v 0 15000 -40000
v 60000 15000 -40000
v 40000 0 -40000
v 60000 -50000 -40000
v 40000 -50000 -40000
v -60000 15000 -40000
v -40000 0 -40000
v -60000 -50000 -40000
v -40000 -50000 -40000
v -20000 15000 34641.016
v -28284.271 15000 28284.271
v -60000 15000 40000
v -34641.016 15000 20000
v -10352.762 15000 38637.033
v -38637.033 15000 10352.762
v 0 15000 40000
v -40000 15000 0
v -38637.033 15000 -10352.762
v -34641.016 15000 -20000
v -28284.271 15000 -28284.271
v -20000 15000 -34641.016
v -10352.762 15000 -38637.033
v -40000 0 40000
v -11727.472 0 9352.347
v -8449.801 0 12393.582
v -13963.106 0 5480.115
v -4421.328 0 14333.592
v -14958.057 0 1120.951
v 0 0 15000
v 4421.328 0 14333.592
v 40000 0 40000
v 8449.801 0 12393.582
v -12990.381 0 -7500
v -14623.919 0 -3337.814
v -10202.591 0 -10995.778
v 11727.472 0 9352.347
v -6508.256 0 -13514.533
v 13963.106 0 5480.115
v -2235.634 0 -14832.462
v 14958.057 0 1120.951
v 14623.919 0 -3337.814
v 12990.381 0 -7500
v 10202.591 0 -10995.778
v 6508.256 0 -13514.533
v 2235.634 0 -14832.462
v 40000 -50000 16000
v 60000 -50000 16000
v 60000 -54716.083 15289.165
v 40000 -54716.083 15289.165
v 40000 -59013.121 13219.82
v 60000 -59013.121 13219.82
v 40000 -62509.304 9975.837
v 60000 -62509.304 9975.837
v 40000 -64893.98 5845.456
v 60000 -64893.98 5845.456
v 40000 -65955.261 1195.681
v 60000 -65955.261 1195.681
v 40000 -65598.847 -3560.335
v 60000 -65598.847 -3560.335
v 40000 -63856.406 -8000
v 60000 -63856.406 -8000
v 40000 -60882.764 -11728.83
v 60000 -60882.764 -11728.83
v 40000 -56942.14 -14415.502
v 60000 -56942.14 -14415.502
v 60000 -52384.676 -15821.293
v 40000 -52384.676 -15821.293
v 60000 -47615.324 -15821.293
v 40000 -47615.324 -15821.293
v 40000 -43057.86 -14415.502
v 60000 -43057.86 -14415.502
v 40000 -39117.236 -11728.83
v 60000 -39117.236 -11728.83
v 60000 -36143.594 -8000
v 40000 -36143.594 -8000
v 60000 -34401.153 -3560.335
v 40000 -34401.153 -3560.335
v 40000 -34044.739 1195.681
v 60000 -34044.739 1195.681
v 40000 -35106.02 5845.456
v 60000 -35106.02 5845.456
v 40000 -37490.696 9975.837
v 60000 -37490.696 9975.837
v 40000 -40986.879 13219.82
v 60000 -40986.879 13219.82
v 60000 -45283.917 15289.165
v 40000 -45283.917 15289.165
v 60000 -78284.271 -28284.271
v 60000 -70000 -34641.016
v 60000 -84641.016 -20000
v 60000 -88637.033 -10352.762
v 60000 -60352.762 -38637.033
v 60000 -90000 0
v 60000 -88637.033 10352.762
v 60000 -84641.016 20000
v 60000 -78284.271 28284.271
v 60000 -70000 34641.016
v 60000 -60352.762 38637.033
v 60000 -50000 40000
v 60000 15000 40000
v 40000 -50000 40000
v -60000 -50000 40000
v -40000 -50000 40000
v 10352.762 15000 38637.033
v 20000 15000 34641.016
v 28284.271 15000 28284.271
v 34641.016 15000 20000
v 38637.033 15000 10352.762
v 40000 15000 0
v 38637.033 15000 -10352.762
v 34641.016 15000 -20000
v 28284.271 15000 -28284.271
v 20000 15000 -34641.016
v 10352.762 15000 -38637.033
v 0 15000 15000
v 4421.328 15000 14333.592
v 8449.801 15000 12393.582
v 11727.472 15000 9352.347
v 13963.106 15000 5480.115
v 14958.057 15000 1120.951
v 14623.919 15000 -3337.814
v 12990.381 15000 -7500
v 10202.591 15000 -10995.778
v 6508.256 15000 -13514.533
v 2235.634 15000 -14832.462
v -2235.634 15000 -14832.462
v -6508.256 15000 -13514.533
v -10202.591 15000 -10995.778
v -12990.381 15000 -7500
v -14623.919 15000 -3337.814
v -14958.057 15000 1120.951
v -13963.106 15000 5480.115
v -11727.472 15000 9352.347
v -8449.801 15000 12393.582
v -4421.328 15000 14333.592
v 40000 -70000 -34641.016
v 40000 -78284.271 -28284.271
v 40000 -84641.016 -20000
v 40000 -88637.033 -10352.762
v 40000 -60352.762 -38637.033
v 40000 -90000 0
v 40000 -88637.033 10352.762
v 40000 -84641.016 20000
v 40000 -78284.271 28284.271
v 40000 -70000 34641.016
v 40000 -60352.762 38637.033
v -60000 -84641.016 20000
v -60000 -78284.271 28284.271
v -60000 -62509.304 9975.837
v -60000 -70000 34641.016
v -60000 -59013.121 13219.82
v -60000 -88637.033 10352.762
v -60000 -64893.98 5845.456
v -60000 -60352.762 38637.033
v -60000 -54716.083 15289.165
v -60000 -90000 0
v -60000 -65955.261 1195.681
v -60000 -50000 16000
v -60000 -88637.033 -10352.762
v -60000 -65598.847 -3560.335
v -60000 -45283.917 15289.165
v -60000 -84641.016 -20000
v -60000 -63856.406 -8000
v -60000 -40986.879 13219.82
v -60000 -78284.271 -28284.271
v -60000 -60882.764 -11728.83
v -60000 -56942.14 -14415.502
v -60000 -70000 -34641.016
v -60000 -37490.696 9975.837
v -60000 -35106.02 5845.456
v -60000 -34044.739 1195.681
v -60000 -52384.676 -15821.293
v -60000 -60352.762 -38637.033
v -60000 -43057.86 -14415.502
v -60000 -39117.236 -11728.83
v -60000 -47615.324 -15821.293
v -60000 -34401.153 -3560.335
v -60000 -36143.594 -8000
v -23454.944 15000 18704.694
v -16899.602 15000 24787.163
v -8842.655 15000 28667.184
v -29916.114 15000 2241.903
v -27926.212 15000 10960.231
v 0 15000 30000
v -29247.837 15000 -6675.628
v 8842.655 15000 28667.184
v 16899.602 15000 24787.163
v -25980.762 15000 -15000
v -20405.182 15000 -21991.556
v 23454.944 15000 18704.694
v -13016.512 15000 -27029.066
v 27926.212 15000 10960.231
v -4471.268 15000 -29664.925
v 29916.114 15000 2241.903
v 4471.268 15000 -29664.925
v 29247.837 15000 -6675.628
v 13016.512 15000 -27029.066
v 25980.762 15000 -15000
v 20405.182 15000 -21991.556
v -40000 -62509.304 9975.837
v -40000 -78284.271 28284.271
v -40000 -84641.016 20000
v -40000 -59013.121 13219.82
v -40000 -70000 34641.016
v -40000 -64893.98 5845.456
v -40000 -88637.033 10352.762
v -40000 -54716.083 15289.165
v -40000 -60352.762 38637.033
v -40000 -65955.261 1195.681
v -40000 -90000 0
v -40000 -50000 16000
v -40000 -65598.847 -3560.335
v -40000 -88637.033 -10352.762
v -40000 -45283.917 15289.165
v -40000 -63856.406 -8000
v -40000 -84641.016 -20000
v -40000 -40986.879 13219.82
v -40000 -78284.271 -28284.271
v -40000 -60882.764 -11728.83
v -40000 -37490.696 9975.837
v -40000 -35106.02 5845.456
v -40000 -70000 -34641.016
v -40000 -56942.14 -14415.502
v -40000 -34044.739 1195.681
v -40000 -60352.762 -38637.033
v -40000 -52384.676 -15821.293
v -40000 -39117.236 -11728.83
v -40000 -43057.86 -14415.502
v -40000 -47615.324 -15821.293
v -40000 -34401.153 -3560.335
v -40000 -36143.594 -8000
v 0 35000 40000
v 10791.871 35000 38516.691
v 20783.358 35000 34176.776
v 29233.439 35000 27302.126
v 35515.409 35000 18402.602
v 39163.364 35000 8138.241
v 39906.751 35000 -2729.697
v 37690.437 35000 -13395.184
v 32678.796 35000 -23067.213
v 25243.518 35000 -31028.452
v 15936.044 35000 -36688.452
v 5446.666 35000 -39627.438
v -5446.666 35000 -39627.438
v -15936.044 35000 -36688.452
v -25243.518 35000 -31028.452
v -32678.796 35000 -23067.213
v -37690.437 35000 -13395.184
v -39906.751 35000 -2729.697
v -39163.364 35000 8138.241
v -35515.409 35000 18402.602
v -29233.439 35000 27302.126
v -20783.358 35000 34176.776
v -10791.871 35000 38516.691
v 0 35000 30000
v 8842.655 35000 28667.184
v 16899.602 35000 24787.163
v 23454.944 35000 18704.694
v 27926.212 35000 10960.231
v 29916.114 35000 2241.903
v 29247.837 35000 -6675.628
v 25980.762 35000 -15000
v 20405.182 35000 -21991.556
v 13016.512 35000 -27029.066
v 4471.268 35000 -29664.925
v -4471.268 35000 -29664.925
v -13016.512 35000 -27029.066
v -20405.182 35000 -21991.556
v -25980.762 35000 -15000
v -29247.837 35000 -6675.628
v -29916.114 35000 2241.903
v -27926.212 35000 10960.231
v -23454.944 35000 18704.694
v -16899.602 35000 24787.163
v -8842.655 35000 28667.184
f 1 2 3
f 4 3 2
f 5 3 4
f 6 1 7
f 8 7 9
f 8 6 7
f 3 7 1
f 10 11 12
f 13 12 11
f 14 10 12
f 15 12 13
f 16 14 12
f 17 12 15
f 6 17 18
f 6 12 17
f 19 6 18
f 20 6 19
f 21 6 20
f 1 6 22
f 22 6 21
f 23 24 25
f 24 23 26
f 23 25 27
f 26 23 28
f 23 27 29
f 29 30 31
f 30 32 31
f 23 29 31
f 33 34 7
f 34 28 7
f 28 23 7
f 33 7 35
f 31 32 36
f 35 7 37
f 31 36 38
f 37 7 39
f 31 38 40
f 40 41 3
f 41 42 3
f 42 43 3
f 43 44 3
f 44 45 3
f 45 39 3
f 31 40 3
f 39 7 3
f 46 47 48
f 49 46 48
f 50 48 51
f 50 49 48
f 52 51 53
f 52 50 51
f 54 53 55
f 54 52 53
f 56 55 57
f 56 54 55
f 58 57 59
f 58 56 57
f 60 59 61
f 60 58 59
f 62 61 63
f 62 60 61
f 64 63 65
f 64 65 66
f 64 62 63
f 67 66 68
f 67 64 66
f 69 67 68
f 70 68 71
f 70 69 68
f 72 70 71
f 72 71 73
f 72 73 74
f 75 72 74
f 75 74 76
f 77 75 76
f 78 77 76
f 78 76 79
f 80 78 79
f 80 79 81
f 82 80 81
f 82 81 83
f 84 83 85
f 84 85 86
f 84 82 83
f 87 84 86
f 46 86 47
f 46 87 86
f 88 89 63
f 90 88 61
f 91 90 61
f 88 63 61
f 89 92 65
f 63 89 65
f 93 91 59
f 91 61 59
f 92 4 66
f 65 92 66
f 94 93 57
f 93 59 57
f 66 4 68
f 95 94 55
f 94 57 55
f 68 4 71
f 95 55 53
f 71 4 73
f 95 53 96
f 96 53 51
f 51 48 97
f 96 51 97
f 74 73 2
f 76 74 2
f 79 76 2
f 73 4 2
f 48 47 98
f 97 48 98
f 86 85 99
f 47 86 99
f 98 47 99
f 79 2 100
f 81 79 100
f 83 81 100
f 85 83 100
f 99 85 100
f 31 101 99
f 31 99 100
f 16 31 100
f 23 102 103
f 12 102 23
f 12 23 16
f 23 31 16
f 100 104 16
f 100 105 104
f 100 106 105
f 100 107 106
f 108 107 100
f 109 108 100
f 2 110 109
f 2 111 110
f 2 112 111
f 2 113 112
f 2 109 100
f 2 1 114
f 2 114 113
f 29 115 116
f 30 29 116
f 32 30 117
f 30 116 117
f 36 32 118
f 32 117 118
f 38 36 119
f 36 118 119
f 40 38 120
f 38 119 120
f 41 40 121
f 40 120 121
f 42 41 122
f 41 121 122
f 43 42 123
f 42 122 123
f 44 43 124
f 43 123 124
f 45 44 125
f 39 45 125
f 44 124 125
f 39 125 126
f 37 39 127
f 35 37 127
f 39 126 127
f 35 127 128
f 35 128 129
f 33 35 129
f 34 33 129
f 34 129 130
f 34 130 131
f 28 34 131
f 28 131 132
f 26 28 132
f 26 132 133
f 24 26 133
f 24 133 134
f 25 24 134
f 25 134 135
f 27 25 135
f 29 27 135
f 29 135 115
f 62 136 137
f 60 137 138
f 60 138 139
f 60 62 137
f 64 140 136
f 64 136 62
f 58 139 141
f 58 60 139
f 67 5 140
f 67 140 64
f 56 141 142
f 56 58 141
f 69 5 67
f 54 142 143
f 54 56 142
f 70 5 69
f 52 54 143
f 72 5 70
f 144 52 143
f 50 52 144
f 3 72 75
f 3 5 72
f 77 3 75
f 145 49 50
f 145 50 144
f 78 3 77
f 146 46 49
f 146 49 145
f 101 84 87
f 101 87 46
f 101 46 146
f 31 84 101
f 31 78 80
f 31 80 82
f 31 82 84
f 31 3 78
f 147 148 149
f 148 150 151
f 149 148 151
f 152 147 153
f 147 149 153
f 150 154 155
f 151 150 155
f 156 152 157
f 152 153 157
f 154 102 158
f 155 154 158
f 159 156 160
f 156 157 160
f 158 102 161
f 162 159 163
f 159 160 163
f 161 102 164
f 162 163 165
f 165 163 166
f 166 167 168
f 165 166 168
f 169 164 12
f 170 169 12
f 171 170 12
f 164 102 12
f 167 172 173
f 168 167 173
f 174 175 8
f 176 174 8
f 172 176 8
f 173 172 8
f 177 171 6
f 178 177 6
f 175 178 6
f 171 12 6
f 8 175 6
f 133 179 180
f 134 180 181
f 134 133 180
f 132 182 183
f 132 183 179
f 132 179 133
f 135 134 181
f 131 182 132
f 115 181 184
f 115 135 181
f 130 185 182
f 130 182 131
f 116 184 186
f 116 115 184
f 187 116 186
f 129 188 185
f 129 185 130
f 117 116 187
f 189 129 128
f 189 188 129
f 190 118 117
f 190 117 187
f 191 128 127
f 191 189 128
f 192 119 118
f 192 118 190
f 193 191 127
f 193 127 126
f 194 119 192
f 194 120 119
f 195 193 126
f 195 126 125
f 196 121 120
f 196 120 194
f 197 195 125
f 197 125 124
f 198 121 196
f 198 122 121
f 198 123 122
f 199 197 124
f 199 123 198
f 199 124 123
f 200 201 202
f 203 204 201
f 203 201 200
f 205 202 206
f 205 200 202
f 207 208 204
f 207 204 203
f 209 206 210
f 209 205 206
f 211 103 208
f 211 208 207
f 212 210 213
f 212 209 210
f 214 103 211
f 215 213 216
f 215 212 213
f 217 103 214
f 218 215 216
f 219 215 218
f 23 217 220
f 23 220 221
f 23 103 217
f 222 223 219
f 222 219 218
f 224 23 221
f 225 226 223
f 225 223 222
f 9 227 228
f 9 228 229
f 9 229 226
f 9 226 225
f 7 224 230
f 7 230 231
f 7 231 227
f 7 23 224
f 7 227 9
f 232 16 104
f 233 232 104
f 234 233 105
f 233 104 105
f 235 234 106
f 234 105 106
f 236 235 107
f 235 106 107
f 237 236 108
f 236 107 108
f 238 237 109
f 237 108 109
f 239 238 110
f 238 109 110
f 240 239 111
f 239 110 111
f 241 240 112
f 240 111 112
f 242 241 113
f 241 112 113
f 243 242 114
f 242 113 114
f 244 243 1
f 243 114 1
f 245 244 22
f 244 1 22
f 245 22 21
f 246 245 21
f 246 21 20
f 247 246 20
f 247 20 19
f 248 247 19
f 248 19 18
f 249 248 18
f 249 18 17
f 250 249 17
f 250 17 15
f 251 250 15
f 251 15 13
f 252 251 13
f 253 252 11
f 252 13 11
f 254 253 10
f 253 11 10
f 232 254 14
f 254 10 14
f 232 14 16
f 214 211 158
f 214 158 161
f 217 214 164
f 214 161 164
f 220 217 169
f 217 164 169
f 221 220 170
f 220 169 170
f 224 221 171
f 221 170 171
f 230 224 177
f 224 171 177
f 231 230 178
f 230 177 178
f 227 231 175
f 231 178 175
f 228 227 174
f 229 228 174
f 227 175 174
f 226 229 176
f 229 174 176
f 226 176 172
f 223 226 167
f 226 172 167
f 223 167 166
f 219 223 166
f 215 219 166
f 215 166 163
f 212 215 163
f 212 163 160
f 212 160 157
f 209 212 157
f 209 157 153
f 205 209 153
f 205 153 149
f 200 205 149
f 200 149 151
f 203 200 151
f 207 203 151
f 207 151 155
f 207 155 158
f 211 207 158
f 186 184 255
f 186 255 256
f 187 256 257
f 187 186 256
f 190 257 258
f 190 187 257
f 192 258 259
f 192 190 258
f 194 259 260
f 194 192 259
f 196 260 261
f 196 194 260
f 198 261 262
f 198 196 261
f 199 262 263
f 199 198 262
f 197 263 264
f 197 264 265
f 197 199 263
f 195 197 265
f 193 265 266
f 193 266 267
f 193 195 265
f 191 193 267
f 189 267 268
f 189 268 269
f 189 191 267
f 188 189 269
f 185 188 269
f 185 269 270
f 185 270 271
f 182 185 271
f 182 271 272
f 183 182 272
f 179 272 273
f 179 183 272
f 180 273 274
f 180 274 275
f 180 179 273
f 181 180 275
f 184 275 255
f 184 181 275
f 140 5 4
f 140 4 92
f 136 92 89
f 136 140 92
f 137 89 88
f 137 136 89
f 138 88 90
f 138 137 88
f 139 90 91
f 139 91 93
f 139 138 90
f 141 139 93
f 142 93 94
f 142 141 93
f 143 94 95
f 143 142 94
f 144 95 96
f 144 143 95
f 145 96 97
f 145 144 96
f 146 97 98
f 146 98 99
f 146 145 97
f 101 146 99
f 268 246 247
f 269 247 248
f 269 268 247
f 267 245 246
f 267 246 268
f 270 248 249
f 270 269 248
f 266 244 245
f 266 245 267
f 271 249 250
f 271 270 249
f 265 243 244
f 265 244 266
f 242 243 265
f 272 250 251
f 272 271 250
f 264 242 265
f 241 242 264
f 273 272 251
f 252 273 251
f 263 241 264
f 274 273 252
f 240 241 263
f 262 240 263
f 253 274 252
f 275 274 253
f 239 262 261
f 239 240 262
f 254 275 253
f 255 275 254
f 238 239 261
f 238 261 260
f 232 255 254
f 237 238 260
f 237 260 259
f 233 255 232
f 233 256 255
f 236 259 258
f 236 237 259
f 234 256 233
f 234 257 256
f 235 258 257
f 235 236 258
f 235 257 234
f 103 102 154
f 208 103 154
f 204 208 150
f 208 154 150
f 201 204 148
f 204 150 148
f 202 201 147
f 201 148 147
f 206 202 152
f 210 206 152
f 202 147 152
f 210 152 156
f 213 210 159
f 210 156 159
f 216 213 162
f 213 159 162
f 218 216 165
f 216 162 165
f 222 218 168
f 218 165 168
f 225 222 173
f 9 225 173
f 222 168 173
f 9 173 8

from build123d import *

# Parameters (mm, degrees)
SKETCH2_W           = 120000
SKETCH2_H           = 80000
BOSS_EXTRUDE1_DEPTH = 15000
SKETCH3_R           = 40000
SKETCH3_R_2         = 30000
BOSS_EXTRUDE2_DEPTH = 20000
SKETCH4_R           = 15000
CUT_EXTRUDE1_DEPTH  = 20000
SKETCH7_W           = 80000
SKETCH7_H           = 50000
BOSS_EXTRUDE4_DEPTH = 20000
BOSS_EXTRUDE5_DEPTH = 20000
SKETCH11_R          = 16000
CUT_EXTRUDE3_DEPTH  = 20499.960430488
BOSS_EXTRUDE7_START = -20000
BOSS_EXTRUDE7_DEPTH = 20000
CUT_EXTRUDE4_START  = -20000
SKETCH15_R          = 16000
CUT_EXTRUDE4_DEPTH  = 20000


with BuildPart() as part:
    # Sketch2 → Boss-Extrude1 (new body)
    with BuildSketch(Plane(origin=(0, 0, 0), x_dir=(1, 0, 0), z_dir=(0, 1, 0))):
        Rectangle(SKETCH2_W, SKETCH2_H)
    extrude(amount=BOSS_EXTRUDE1_DEPTH)

    # Sketch3 → Boss-Extrude2 (add)
    with BuildSketch(Plane(origin=(0, 15000, 0), x_dir=(1, 0, 0), z_dir=(0, 1, 0))):
        with Locations(Location((0, 0, 0), (0, 0, 270))):
            Circle(SKETCH3_R)
        with Locations(Location((0, 0, 0), (0, 0, 270))):
            Circle(SKETCH3_R_2, mode=Mode.SUBTRACT)
    extrude(amount=BOSS_EXTRUDE2_DEPTH)

    # Sketch4 → Cut-Extrude1 (cut)
    with BuildSketch(Plane(origin=(0, 15000, 0), x_dir=(1, 0, 0), z_dir=(0, 1, 0))):
        with Locations(Location((0, 0, 0), (0, 0, 270))):
            Circle(SKETCH4_R)
    extrude(amount=-CUT_EXTRUDE1_DEPTH, mode=Mode.SUBTRACT)

    # Sketch7 → Boss-Extrude4 (add)
    with BuildSketch(Plane.ZY.offset(60000)):
        with Locations((0, -25000)):
            Rectangle(SKETCH7_W, SKETCH7_H)
    extrude(amount=-BOSS_EXTRUDE4_DEPTH)

    # Sketch9 → Boss-Extrude5 (add)
    with BuildSketch(Plane.ZY.offset(60000)):
        with BuildLine():
            Line((-40000, -50000), (40000, -50000))
            ThreePointArc((40000, -50000), (0, -90000), (-40000, -50000))
        make_face()
    extrude(amount=-BOSS_EXTRUDE5_DEPTH)

    # Sketch11 → Cut-Extrude3 (cut)
    with BuildSketch(Plane.ZY.offset(60000)):
        with Locations((0, -50000)):
            Circle(SKETCH11_R)
    extrude(amount=-CUT_EXTRUDE3_DEPTH, mode=Mode.SUBTRACT)

    # Sketch14 → Boss-Extrude7 (add)
    with BuildSketch(Plane(origin=(60000, 0, 0), x_dir=(0, 0, -1), z_dir=(1, 0, 0)).offset(BOSS_EXTRUDE7_START)):
        with BuildLine():
            Line((-40000, 0), (40000, 0))
            Line((40000, 0), (40000, -50000))
            ThreePointArc((40000, -50000), (0, -90000), (-40000, -50000))
            Line((-40000, -50000), (-40000, 0))
        make_face()
    extrude(amount=BOSS_EXTRUDE7_DEPTH)

    # Sketch15 → Cut-Extrude4 (cut)
    with BuildSketch(Plane(origin=(60000, 0, 0), x_dir=(0, 0, -1), z_dir=(1, 0, 0)).offset(CUT_EXTRUDE4_START)):
        with Locations(Location((0, -50000, 0), (0, 0, 180))):
            Circle(SKETCH15_R)
    extrude(amount=CUT_EXTRUDE4_DEPTH, mode=Mode.SUBTRACT)


solid = part.part
